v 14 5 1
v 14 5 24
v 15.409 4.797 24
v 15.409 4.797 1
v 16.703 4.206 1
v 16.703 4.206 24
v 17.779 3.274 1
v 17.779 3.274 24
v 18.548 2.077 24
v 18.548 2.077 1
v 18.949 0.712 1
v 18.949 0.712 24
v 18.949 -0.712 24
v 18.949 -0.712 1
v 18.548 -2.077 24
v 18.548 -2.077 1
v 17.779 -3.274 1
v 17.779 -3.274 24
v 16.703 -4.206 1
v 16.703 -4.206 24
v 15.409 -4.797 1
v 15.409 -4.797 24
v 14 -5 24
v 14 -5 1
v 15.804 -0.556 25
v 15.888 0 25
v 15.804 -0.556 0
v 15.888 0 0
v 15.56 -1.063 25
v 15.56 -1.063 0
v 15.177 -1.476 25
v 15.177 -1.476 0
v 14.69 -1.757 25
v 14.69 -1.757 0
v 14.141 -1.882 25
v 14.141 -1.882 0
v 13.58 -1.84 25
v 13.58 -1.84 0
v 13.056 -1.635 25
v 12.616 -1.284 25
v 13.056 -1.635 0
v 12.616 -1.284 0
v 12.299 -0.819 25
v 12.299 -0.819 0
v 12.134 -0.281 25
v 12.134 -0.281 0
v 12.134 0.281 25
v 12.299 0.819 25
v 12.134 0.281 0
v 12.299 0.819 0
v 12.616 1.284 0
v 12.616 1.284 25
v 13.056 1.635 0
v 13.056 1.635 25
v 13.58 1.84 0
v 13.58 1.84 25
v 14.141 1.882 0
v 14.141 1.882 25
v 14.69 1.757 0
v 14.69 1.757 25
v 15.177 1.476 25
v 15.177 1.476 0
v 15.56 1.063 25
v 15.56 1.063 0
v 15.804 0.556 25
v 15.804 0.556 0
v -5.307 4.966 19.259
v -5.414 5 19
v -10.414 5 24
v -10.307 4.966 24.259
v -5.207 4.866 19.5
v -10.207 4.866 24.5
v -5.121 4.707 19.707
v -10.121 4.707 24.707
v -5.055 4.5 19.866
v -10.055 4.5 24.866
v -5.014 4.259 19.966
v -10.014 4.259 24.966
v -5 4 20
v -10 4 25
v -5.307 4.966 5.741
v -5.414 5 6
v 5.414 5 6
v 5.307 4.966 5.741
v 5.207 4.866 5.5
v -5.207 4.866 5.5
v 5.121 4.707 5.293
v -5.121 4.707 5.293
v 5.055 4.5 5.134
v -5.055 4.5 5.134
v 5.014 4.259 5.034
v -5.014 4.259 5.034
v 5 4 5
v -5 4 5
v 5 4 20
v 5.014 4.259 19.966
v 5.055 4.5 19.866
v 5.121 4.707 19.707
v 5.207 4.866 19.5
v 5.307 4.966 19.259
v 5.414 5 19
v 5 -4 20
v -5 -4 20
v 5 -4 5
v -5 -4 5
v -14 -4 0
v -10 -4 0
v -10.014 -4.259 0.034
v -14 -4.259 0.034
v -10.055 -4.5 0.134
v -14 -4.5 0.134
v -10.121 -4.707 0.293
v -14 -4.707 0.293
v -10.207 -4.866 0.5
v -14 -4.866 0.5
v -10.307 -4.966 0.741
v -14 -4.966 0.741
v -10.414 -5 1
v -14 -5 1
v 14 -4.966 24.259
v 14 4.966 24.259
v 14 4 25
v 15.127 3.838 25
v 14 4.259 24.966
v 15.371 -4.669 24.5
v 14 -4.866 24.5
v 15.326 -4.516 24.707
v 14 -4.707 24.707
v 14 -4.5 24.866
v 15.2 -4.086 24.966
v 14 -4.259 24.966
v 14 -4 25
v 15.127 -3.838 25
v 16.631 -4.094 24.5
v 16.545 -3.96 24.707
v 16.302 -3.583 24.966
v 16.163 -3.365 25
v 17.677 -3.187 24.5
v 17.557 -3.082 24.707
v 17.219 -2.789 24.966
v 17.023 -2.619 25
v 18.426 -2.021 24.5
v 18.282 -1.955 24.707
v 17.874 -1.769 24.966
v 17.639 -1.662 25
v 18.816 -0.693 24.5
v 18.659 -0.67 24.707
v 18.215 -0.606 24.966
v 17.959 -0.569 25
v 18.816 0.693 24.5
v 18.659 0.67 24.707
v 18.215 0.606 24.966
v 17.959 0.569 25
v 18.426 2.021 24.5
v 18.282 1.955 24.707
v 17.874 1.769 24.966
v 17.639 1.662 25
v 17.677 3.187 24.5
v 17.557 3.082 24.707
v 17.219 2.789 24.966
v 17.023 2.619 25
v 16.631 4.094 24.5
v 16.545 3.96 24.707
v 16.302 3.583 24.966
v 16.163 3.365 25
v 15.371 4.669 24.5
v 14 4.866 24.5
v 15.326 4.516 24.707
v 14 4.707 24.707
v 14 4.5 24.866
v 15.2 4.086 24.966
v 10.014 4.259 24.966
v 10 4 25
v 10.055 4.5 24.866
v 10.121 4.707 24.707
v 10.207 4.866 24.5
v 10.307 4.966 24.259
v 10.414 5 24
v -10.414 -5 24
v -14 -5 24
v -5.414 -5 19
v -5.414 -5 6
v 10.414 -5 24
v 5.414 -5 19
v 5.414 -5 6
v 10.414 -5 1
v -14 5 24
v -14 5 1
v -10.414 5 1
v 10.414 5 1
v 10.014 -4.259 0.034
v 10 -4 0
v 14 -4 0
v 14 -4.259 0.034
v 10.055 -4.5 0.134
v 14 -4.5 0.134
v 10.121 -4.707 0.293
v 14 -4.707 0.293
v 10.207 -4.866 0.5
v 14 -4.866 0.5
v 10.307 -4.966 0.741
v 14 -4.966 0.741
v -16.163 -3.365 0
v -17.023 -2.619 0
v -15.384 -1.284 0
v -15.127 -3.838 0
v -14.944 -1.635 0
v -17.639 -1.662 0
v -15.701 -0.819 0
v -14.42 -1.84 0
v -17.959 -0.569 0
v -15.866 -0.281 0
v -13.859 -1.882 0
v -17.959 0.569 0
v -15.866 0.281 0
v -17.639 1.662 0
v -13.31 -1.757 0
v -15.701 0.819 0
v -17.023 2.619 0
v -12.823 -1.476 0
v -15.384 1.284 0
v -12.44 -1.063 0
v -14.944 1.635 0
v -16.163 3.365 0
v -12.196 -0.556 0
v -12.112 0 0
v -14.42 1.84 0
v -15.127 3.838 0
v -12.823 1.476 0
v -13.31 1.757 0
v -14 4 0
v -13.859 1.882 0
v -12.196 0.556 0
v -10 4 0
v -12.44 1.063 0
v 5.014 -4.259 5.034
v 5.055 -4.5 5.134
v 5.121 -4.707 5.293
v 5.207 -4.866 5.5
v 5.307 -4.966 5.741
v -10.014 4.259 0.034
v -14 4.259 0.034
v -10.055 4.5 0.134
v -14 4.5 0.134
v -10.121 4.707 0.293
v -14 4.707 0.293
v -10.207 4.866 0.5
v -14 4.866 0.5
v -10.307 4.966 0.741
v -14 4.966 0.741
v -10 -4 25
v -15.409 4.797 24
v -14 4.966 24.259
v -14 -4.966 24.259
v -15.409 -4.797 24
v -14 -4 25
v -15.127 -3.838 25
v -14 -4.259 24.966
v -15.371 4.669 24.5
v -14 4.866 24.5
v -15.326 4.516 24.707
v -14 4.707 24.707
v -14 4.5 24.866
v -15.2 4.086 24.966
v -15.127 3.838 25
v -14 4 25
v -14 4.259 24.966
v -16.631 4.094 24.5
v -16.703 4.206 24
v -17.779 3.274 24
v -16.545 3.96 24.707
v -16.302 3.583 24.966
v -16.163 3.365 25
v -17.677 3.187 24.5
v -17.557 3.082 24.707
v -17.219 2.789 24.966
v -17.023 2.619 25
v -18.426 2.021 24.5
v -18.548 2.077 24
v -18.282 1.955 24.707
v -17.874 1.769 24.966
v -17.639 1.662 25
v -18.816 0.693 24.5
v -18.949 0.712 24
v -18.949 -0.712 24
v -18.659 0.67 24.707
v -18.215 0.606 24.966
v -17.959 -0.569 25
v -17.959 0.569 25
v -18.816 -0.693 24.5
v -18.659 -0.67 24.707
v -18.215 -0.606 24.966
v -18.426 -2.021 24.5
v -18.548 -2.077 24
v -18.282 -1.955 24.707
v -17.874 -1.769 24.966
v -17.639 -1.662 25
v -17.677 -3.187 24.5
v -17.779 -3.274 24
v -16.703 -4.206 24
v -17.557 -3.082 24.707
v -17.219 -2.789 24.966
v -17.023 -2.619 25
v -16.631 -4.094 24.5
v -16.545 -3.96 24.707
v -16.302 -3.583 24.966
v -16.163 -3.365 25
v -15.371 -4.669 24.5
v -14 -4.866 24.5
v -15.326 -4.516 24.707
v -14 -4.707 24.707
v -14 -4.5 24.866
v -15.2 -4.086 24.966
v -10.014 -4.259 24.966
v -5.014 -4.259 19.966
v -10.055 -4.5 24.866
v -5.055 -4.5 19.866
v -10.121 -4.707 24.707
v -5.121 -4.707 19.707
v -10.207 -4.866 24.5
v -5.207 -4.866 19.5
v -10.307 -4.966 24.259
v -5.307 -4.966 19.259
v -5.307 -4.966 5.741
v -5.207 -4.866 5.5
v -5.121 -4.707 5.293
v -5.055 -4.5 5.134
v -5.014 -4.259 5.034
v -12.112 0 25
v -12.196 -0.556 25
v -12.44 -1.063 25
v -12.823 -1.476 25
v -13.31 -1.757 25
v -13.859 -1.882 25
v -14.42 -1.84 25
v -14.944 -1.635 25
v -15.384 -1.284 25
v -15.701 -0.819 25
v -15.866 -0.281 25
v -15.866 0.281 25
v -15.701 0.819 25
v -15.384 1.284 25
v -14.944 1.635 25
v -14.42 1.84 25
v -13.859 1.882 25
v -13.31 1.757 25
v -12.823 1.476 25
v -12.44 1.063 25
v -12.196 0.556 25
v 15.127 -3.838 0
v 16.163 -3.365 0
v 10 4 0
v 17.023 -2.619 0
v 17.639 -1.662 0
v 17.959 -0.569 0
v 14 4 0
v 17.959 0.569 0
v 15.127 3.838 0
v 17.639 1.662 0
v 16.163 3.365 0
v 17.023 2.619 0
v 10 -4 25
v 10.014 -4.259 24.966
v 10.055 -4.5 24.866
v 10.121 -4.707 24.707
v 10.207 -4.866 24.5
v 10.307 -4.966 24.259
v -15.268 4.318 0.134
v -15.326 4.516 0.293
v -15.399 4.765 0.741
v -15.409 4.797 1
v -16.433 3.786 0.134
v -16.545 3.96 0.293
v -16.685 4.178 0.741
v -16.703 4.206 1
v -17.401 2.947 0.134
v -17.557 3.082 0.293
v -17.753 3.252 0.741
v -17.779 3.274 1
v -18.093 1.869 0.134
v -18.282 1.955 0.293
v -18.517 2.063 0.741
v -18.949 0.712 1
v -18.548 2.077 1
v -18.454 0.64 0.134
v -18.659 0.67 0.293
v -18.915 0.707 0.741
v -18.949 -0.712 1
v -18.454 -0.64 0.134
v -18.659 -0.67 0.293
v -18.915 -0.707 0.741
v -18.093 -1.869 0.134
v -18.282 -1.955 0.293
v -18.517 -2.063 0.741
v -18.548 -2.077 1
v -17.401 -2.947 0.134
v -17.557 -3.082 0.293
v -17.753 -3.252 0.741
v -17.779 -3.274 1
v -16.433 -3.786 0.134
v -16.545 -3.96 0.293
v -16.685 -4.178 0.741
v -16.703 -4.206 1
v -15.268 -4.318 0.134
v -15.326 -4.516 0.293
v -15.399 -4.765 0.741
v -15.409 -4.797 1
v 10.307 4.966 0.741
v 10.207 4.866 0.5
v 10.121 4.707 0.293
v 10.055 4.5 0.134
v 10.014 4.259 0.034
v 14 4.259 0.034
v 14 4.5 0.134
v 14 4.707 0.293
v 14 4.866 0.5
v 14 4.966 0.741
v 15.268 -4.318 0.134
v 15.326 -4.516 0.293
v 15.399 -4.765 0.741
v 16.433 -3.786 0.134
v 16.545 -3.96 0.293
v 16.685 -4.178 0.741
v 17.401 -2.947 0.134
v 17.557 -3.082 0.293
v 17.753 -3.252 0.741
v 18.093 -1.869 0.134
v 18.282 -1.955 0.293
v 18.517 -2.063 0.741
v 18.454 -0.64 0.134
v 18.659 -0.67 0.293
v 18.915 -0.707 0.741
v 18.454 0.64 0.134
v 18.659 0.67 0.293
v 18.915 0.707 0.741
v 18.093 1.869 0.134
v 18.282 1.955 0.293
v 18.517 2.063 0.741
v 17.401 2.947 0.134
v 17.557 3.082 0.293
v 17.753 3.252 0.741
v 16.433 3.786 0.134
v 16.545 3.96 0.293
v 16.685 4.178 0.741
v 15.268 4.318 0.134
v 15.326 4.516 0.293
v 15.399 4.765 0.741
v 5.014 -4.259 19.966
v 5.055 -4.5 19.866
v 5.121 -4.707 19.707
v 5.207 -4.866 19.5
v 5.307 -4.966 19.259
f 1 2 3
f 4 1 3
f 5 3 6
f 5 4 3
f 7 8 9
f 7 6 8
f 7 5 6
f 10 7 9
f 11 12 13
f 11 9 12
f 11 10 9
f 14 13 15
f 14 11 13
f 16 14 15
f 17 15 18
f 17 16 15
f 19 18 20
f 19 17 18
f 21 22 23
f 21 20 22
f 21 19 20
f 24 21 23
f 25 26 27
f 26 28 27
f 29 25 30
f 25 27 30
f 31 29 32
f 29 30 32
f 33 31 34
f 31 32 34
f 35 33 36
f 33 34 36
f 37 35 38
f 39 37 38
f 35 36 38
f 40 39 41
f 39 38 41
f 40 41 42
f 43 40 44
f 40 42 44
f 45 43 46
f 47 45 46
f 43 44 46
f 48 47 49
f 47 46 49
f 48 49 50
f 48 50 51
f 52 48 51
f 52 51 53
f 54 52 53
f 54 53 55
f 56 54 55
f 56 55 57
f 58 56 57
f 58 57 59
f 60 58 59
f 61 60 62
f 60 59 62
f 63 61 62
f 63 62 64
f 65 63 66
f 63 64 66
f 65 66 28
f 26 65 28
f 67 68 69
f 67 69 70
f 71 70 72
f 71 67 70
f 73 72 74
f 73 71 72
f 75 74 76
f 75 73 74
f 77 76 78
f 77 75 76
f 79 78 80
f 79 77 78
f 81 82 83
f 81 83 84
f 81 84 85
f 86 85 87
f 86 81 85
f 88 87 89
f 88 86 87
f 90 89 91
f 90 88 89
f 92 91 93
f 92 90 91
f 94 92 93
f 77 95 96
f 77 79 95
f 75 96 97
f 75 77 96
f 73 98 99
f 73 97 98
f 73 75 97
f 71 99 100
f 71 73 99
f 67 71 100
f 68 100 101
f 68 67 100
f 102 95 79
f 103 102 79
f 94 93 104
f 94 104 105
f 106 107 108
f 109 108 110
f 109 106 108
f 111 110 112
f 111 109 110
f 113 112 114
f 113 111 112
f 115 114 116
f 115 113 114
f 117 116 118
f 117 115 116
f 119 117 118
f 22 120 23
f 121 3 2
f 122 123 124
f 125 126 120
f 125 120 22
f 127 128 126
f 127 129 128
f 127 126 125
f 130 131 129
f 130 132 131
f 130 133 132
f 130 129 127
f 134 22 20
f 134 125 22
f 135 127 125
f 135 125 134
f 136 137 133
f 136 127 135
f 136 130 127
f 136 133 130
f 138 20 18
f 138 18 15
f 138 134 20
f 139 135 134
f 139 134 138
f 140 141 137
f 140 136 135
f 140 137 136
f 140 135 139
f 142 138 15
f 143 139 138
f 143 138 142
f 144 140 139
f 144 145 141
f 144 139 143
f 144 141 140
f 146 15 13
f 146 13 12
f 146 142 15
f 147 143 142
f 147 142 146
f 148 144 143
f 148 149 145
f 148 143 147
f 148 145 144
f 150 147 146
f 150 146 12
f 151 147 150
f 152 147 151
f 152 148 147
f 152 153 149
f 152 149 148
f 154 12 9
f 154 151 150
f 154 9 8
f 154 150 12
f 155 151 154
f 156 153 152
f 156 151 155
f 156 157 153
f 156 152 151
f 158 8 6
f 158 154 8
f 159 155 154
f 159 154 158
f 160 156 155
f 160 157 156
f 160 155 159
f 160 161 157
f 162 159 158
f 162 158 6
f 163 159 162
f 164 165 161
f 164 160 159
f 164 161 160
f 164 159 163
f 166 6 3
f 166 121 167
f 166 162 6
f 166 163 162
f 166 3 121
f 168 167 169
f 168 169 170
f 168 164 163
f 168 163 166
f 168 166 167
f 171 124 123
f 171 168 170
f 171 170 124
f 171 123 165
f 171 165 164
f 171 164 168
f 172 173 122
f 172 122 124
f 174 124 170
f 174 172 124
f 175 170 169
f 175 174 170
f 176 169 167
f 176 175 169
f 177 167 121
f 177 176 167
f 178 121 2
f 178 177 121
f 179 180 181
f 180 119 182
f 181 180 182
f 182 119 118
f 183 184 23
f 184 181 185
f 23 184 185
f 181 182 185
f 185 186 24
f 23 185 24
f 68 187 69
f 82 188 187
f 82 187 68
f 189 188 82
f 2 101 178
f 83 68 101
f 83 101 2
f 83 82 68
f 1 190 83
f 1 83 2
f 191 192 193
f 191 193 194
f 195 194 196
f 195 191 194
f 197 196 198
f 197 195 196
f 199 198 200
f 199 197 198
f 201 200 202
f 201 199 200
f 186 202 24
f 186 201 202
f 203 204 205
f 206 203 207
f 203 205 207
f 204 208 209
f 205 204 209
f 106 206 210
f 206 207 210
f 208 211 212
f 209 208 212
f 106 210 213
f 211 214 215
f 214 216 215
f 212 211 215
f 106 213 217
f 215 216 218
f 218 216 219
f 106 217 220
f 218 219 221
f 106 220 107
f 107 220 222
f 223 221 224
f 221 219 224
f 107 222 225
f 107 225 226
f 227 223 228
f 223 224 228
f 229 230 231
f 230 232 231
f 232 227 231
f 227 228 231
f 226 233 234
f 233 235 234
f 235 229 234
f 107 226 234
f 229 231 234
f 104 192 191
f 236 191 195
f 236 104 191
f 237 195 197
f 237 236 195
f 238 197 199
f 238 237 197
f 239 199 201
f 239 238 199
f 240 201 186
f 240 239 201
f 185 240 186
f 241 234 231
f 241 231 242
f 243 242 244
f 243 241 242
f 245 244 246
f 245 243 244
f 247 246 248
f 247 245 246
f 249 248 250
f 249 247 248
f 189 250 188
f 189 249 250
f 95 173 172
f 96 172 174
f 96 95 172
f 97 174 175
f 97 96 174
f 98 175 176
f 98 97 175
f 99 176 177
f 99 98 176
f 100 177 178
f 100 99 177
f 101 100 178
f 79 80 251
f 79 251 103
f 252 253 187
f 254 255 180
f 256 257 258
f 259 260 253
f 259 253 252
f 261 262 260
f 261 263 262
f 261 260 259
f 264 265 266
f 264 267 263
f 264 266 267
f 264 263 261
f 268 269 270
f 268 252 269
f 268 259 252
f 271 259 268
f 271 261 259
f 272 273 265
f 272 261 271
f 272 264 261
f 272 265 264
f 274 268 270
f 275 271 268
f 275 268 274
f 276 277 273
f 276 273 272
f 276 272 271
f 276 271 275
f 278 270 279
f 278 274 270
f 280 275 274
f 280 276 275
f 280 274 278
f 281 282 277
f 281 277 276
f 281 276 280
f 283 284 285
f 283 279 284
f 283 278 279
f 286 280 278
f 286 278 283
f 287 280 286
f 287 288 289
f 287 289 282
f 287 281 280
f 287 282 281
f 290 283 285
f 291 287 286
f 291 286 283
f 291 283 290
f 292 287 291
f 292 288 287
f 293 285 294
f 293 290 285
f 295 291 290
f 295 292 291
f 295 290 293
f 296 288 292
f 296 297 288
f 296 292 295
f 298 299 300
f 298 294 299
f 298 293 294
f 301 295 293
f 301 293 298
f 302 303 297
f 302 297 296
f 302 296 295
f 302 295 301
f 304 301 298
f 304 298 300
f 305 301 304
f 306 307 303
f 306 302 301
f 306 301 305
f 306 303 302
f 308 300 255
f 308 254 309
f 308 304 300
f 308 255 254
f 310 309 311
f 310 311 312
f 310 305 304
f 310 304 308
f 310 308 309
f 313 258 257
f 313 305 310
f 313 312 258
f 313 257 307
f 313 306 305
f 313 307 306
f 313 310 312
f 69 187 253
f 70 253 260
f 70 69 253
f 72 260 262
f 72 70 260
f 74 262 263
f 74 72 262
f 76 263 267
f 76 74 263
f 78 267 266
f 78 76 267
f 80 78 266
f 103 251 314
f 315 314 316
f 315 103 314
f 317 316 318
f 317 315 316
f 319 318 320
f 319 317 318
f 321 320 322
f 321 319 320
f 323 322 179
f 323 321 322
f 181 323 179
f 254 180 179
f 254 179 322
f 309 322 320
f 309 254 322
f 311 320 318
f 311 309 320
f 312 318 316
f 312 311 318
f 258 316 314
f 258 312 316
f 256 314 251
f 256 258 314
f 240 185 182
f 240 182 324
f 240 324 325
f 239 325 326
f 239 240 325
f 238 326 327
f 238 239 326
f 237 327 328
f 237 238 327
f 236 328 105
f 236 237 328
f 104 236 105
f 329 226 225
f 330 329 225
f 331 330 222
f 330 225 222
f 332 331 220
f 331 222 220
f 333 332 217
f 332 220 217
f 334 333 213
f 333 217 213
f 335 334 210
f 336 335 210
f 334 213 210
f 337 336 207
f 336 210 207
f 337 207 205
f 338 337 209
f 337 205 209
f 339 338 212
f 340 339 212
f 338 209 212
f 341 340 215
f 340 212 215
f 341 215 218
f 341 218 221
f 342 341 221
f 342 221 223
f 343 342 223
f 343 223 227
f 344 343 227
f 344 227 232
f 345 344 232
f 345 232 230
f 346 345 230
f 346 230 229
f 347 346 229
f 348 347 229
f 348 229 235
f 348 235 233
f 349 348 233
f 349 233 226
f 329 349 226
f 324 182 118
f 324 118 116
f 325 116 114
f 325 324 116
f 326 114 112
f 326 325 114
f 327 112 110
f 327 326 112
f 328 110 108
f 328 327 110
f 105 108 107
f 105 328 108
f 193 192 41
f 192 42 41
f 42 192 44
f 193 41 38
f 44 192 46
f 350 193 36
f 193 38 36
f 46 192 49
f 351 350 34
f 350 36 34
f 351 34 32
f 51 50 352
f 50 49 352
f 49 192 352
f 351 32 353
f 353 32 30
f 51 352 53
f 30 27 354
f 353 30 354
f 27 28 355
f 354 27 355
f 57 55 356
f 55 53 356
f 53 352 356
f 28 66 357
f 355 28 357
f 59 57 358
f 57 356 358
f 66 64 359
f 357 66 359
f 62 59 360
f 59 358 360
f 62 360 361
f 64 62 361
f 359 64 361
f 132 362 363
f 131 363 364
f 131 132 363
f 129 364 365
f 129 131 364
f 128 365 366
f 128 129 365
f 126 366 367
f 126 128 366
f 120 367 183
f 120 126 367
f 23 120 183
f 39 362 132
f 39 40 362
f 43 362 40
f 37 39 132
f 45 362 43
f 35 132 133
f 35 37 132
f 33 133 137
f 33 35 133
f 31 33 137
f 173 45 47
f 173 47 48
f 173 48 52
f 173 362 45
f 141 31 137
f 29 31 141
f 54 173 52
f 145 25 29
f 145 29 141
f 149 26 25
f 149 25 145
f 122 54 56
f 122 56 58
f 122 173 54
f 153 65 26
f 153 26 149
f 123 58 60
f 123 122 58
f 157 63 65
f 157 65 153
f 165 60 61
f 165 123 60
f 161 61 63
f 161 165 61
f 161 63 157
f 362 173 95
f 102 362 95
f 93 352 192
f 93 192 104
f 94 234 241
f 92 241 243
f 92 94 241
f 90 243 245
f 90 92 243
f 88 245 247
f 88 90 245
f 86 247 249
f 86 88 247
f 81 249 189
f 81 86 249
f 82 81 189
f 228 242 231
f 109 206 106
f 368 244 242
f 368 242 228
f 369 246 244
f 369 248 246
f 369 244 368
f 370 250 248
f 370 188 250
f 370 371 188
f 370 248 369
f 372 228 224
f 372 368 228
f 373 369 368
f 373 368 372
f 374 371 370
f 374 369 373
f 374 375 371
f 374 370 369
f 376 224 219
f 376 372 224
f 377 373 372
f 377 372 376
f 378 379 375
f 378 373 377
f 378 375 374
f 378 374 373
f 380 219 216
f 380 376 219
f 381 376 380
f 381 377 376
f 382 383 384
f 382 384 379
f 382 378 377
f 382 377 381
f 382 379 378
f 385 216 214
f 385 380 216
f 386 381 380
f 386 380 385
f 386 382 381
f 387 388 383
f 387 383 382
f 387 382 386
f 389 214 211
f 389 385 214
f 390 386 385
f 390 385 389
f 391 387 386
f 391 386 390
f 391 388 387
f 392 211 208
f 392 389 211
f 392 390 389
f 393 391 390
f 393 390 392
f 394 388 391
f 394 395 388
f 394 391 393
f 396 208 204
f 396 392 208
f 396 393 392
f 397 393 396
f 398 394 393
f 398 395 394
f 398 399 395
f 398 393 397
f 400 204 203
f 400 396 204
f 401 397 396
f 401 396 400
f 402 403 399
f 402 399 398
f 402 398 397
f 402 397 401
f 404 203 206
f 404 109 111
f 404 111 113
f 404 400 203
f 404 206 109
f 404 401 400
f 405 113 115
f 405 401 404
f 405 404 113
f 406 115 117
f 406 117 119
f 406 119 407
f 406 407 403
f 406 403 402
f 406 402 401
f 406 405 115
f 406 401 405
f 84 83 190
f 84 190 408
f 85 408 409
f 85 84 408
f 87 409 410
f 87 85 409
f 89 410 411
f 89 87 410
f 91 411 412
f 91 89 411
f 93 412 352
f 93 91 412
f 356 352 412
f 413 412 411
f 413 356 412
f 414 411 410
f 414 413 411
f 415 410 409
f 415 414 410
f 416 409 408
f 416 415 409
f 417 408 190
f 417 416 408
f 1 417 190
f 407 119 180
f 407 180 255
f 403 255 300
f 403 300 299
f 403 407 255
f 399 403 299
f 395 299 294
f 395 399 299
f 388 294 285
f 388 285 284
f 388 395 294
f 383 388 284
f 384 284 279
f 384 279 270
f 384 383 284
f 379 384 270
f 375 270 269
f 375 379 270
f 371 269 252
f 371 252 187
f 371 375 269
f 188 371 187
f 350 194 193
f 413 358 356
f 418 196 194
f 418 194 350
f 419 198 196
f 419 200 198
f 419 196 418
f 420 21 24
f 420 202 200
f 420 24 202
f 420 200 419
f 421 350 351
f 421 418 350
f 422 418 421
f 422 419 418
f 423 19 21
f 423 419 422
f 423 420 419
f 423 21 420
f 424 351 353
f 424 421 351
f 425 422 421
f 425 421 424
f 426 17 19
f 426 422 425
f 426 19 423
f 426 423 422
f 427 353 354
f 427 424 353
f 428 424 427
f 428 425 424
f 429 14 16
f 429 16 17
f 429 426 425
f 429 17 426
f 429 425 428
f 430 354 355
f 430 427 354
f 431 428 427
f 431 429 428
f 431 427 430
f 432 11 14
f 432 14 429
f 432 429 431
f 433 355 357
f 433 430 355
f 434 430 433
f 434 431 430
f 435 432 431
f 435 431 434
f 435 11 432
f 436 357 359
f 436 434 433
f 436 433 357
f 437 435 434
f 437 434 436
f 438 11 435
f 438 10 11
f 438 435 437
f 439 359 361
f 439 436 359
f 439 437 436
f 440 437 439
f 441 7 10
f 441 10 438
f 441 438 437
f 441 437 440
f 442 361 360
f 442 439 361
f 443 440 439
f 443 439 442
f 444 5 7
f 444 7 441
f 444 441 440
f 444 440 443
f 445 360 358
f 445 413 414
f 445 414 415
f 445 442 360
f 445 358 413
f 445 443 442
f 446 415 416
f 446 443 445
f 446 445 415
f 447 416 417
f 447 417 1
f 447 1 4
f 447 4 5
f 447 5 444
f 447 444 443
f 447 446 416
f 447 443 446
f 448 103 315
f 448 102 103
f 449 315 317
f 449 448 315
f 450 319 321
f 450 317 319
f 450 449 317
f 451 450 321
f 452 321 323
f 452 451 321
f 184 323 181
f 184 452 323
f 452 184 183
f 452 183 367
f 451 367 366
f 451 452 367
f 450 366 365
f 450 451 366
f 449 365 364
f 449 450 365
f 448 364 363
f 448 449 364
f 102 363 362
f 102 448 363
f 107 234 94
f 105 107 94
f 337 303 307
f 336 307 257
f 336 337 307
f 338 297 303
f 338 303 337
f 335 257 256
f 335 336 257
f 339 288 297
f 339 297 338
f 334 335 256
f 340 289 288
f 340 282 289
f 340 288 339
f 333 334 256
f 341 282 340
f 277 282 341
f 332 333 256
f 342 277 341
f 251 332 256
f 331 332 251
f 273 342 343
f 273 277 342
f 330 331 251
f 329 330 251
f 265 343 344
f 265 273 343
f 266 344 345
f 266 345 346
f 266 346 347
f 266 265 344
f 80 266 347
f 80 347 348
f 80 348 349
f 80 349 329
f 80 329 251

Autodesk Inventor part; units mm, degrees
ref_plane "YZ Plane" through (0, 0, 0) normal (1, 0, 0) x (0, 1, 0)
ref_plane "XZ Plane" through (0, 0, 0) normal (0, 1, 0) x (-1, 0, 0)
ref_plane "XY Plane" through (0, 0, 0) normal (0, 0, 1) x (1, 0, 0)
sketch "Sketch1" plane through (0, 0, 0) normal (0, 0, 1) x (1, 0, 0)
  circle A0 centre (-14, 0) radius 1.8875
  circle A1 centre (-14, 0) radius 5
  line L0 (0, -7) -> (0, 7) projected
  circle A2 centre (14, 0) radius 1.8875
  circle A3 centre (14, 0) radius 5
  line L1 (-14, 5) -> (-5, 5)
  line L2 (-5, 5) -> (0, 5)
  line L3 (14, 5) -> (5, 5)
  line L4 (5, 5) -> (0, 5)
  line L5 (-26.6, 0) -> (26.6, 0) projected
  line L6 (-14, -5) -> (-5, -5)
  line L7 (-5, -5) -> (0, -5)
  line L8 (5, -5) -> (0, -5)
  line L9 (14, -5) -> (5, -5)
  point P0 (0, 0)
  point P1 (14, 5)
  point P2 (-14, -5)
  point P3 (14, -5)
  dimension "d1" = 10
  dimension "d0" = 3.775
  dimension "d2" = 28
  dimension "d3" = 5
  dimension "d4" = 5
extrude "Extrusion1" add sketch "Sketch1" along normal blind 25 contours L5 A1 A0 | A0 L5 A1 | L5 L0 L7 L6 A1 | A1 L1 L2 L0 L5 | L5 A3 L9 L8 L0 | L0 L4 L3 A3 L5 | L5 A2 A3 | A3 L5 A2
sketch "Sketch2" plane through (-14, 5, 0) normal (0, 1, 0) x (1, 0, 0)
  line L0 (28, -25) -> (0, -25) projected
  line L1 (4, -25) -> (9, -20)
  line L2 (9, -20) -> (14, -20)
  line L3 (28, 0) -> (0, 0) projected
  line L4 (28, 0) -> (28, -25) projected
  line L5 (28, -12.5) -> (1.8875, -12.5)
  line L6 (1.8875, -25) -> (1.8875, 0) projected
  line L7 (28, 0) -> (0, 0)
  line L8 (4, 0) -> (9, -5)
  line L9 (9, -5) -> (14, -5)
  line L10 (14, -25) -> (14, 0)
  line L11 (24, -25) -> (19, -20)
  line L12 (19, -20) -> (14, -20)
  line L13 (24, 0) -> (19, -5)
  line L14 (19, -5) -> (14, -5)
  point P0 (14, 0)
  point P1 (4, 0)
  dimension "d7" = 45
  dimension "d8" = 15
  dimension "d9" = 10
extrude "Extrusion2" cut sketch "Sketch2" against normal up to surface (10 mm away) contours L0 L10 L12 L11 | L0 L1 L2 L10 | L13 L14 L10 L3 | L9 L8 L3 L10
fillet "Fillet1" radius 1 20 edges at (-12, -5, 25) (-12, 5, 25) (-19, 0, 25) (-7.5, 5, 22.5) (0, 5, 20) (7.5, 5, 22.5) (19, 0, 25) (-7.5, -5, 22.5) (0, -5, 20) (7.5, -5, 22.5) (19, 0, 0) (-12, 5, 0) (-12, -5, 0) (7.5, -5, 2.5) (0, -5, 5) (-7.5, -5, 2.5) (-19, 0, 0) (-7.5, 5, 2.5) (0, 5, 5) (7.5, 5, 2.5)
properties part number "ConectorBrazos"
